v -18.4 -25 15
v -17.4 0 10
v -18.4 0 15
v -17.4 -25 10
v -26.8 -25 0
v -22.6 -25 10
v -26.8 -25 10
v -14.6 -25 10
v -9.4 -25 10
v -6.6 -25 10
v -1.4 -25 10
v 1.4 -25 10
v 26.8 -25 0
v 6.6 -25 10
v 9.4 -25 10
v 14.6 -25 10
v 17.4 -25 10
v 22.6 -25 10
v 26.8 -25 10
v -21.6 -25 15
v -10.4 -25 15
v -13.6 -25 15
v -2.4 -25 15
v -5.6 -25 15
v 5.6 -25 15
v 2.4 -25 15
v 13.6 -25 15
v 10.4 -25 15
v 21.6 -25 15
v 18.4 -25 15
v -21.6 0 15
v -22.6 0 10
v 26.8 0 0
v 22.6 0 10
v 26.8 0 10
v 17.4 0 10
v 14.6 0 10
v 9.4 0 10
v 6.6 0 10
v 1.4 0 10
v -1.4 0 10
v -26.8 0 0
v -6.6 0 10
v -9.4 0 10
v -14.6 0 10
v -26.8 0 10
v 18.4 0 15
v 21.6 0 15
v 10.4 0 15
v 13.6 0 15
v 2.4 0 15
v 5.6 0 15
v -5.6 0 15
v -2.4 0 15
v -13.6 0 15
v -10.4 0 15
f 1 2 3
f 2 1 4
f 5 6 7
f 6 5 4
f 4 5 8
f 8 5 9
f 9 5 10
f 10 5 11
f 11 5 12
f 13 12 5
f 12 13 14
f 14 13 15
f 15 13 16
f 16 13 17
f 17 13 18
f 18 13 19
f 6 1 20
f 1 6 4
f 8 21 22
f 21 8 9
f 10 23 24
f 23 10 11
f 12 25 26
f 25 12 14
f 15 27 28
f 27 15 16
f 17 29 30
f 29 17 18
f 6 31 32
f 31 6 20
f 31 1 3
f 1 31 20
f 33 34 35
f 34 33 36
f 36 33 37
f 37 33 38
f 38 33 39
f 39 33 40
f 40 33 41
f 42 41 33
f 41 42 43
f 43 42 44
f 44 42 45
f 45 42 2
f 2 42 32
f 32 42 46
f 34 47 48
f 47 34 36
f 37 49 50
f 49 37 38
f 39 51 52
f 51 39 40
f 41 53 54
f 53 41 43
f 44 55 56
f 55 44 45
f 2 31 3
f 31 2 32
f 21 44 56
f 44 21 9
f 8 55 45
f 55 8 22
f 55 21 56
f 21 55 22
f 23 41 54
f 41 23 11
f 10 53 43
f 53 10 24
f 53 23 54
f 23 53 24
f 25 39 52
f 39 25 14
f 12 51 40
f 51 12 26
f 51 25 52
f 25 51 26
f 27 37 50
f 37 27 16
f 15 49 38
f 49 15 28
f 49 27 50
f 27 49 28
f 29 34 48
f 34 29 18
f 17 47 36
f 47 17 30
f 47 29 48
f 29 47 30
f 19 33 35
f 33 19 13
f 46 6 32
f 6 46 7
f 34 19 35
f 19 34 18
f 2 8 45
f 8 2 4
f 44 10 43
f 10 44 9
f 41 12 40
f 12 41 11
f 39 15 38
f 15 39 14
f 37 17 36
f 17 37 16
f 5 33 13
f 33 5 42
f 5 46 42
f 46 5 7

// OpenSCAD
$fn = 32;

// ----------------------------------------------------------------------
// Toothed rack, 6 teeth
// 8 mm pitch, 5 mm teeth
// ----------------------------------------------------------------------

// --- parameters (mm) ---
bar_w = 25;       // bar width (Y)
seat_tol = 0.15;  // tolerance at the seating features
free_tol = 0.5;   // general tolerance on the free sizes
bar_h = 10;       // bar height (Z)
teeth = 6;        // number of teeth
pitch = 8;        // tooth pitch
tooth_h = 5;      // tooth height above the bar
root_w = 5.6;     // tooth width at the root
crest_w = 3.2;    // tooth width at the crest

// --- derived feature positions (mm) ---
span = (teeth - 1) * pitch;  // = 40   distance between the outer teeth
bar_l = span + root_w + 8;   // = 53.6   bar length: teeth plus 4 mm at each end
tooth_x = -span / 2;         // = -20   X of the first tooth
height = bar_h + tooth_h;    // = 15   overall height
feature_centers = [
  [tooth_x + 0 * pitch, -bar_w / 2],
  [tooth_x + 1 * pitch, -bar_w / 2],
  [tooth_x + 2 * pitch, -bar_w / 2],
  [tooth_x + 3 * pitch, -bar_w / 2],
  [tooth_x + 4 * pitch, -bar_w / 2],
  [tooth_x + 5 * pitch, -bar_w / 2]
];   // tooth centre line, drives the tooth loop

// bar with a rack of teeth, one extruded trapezoium per centre
module rack_tooth() {
  linear_extrude(height = bar_w)
    polygon(points = [
      [0, 0],
      [root_w, 0],
      [root_w / 2 + crest_w / 2, tooth_h + 1],
      [root_w / 2 - crest_w / 2, tooth_h + 1]
    ]);
}

union() {
  translate([-bar_l / 2, -bar_w, 0]) cube([bar_l, bar_w, bar_h]);
  for (centre = feature_centers)
    translate([centre[0] - root_w / 2, 0, bar_h - 1]) rotate([90, 0, 0]) rack_tooth();
}
